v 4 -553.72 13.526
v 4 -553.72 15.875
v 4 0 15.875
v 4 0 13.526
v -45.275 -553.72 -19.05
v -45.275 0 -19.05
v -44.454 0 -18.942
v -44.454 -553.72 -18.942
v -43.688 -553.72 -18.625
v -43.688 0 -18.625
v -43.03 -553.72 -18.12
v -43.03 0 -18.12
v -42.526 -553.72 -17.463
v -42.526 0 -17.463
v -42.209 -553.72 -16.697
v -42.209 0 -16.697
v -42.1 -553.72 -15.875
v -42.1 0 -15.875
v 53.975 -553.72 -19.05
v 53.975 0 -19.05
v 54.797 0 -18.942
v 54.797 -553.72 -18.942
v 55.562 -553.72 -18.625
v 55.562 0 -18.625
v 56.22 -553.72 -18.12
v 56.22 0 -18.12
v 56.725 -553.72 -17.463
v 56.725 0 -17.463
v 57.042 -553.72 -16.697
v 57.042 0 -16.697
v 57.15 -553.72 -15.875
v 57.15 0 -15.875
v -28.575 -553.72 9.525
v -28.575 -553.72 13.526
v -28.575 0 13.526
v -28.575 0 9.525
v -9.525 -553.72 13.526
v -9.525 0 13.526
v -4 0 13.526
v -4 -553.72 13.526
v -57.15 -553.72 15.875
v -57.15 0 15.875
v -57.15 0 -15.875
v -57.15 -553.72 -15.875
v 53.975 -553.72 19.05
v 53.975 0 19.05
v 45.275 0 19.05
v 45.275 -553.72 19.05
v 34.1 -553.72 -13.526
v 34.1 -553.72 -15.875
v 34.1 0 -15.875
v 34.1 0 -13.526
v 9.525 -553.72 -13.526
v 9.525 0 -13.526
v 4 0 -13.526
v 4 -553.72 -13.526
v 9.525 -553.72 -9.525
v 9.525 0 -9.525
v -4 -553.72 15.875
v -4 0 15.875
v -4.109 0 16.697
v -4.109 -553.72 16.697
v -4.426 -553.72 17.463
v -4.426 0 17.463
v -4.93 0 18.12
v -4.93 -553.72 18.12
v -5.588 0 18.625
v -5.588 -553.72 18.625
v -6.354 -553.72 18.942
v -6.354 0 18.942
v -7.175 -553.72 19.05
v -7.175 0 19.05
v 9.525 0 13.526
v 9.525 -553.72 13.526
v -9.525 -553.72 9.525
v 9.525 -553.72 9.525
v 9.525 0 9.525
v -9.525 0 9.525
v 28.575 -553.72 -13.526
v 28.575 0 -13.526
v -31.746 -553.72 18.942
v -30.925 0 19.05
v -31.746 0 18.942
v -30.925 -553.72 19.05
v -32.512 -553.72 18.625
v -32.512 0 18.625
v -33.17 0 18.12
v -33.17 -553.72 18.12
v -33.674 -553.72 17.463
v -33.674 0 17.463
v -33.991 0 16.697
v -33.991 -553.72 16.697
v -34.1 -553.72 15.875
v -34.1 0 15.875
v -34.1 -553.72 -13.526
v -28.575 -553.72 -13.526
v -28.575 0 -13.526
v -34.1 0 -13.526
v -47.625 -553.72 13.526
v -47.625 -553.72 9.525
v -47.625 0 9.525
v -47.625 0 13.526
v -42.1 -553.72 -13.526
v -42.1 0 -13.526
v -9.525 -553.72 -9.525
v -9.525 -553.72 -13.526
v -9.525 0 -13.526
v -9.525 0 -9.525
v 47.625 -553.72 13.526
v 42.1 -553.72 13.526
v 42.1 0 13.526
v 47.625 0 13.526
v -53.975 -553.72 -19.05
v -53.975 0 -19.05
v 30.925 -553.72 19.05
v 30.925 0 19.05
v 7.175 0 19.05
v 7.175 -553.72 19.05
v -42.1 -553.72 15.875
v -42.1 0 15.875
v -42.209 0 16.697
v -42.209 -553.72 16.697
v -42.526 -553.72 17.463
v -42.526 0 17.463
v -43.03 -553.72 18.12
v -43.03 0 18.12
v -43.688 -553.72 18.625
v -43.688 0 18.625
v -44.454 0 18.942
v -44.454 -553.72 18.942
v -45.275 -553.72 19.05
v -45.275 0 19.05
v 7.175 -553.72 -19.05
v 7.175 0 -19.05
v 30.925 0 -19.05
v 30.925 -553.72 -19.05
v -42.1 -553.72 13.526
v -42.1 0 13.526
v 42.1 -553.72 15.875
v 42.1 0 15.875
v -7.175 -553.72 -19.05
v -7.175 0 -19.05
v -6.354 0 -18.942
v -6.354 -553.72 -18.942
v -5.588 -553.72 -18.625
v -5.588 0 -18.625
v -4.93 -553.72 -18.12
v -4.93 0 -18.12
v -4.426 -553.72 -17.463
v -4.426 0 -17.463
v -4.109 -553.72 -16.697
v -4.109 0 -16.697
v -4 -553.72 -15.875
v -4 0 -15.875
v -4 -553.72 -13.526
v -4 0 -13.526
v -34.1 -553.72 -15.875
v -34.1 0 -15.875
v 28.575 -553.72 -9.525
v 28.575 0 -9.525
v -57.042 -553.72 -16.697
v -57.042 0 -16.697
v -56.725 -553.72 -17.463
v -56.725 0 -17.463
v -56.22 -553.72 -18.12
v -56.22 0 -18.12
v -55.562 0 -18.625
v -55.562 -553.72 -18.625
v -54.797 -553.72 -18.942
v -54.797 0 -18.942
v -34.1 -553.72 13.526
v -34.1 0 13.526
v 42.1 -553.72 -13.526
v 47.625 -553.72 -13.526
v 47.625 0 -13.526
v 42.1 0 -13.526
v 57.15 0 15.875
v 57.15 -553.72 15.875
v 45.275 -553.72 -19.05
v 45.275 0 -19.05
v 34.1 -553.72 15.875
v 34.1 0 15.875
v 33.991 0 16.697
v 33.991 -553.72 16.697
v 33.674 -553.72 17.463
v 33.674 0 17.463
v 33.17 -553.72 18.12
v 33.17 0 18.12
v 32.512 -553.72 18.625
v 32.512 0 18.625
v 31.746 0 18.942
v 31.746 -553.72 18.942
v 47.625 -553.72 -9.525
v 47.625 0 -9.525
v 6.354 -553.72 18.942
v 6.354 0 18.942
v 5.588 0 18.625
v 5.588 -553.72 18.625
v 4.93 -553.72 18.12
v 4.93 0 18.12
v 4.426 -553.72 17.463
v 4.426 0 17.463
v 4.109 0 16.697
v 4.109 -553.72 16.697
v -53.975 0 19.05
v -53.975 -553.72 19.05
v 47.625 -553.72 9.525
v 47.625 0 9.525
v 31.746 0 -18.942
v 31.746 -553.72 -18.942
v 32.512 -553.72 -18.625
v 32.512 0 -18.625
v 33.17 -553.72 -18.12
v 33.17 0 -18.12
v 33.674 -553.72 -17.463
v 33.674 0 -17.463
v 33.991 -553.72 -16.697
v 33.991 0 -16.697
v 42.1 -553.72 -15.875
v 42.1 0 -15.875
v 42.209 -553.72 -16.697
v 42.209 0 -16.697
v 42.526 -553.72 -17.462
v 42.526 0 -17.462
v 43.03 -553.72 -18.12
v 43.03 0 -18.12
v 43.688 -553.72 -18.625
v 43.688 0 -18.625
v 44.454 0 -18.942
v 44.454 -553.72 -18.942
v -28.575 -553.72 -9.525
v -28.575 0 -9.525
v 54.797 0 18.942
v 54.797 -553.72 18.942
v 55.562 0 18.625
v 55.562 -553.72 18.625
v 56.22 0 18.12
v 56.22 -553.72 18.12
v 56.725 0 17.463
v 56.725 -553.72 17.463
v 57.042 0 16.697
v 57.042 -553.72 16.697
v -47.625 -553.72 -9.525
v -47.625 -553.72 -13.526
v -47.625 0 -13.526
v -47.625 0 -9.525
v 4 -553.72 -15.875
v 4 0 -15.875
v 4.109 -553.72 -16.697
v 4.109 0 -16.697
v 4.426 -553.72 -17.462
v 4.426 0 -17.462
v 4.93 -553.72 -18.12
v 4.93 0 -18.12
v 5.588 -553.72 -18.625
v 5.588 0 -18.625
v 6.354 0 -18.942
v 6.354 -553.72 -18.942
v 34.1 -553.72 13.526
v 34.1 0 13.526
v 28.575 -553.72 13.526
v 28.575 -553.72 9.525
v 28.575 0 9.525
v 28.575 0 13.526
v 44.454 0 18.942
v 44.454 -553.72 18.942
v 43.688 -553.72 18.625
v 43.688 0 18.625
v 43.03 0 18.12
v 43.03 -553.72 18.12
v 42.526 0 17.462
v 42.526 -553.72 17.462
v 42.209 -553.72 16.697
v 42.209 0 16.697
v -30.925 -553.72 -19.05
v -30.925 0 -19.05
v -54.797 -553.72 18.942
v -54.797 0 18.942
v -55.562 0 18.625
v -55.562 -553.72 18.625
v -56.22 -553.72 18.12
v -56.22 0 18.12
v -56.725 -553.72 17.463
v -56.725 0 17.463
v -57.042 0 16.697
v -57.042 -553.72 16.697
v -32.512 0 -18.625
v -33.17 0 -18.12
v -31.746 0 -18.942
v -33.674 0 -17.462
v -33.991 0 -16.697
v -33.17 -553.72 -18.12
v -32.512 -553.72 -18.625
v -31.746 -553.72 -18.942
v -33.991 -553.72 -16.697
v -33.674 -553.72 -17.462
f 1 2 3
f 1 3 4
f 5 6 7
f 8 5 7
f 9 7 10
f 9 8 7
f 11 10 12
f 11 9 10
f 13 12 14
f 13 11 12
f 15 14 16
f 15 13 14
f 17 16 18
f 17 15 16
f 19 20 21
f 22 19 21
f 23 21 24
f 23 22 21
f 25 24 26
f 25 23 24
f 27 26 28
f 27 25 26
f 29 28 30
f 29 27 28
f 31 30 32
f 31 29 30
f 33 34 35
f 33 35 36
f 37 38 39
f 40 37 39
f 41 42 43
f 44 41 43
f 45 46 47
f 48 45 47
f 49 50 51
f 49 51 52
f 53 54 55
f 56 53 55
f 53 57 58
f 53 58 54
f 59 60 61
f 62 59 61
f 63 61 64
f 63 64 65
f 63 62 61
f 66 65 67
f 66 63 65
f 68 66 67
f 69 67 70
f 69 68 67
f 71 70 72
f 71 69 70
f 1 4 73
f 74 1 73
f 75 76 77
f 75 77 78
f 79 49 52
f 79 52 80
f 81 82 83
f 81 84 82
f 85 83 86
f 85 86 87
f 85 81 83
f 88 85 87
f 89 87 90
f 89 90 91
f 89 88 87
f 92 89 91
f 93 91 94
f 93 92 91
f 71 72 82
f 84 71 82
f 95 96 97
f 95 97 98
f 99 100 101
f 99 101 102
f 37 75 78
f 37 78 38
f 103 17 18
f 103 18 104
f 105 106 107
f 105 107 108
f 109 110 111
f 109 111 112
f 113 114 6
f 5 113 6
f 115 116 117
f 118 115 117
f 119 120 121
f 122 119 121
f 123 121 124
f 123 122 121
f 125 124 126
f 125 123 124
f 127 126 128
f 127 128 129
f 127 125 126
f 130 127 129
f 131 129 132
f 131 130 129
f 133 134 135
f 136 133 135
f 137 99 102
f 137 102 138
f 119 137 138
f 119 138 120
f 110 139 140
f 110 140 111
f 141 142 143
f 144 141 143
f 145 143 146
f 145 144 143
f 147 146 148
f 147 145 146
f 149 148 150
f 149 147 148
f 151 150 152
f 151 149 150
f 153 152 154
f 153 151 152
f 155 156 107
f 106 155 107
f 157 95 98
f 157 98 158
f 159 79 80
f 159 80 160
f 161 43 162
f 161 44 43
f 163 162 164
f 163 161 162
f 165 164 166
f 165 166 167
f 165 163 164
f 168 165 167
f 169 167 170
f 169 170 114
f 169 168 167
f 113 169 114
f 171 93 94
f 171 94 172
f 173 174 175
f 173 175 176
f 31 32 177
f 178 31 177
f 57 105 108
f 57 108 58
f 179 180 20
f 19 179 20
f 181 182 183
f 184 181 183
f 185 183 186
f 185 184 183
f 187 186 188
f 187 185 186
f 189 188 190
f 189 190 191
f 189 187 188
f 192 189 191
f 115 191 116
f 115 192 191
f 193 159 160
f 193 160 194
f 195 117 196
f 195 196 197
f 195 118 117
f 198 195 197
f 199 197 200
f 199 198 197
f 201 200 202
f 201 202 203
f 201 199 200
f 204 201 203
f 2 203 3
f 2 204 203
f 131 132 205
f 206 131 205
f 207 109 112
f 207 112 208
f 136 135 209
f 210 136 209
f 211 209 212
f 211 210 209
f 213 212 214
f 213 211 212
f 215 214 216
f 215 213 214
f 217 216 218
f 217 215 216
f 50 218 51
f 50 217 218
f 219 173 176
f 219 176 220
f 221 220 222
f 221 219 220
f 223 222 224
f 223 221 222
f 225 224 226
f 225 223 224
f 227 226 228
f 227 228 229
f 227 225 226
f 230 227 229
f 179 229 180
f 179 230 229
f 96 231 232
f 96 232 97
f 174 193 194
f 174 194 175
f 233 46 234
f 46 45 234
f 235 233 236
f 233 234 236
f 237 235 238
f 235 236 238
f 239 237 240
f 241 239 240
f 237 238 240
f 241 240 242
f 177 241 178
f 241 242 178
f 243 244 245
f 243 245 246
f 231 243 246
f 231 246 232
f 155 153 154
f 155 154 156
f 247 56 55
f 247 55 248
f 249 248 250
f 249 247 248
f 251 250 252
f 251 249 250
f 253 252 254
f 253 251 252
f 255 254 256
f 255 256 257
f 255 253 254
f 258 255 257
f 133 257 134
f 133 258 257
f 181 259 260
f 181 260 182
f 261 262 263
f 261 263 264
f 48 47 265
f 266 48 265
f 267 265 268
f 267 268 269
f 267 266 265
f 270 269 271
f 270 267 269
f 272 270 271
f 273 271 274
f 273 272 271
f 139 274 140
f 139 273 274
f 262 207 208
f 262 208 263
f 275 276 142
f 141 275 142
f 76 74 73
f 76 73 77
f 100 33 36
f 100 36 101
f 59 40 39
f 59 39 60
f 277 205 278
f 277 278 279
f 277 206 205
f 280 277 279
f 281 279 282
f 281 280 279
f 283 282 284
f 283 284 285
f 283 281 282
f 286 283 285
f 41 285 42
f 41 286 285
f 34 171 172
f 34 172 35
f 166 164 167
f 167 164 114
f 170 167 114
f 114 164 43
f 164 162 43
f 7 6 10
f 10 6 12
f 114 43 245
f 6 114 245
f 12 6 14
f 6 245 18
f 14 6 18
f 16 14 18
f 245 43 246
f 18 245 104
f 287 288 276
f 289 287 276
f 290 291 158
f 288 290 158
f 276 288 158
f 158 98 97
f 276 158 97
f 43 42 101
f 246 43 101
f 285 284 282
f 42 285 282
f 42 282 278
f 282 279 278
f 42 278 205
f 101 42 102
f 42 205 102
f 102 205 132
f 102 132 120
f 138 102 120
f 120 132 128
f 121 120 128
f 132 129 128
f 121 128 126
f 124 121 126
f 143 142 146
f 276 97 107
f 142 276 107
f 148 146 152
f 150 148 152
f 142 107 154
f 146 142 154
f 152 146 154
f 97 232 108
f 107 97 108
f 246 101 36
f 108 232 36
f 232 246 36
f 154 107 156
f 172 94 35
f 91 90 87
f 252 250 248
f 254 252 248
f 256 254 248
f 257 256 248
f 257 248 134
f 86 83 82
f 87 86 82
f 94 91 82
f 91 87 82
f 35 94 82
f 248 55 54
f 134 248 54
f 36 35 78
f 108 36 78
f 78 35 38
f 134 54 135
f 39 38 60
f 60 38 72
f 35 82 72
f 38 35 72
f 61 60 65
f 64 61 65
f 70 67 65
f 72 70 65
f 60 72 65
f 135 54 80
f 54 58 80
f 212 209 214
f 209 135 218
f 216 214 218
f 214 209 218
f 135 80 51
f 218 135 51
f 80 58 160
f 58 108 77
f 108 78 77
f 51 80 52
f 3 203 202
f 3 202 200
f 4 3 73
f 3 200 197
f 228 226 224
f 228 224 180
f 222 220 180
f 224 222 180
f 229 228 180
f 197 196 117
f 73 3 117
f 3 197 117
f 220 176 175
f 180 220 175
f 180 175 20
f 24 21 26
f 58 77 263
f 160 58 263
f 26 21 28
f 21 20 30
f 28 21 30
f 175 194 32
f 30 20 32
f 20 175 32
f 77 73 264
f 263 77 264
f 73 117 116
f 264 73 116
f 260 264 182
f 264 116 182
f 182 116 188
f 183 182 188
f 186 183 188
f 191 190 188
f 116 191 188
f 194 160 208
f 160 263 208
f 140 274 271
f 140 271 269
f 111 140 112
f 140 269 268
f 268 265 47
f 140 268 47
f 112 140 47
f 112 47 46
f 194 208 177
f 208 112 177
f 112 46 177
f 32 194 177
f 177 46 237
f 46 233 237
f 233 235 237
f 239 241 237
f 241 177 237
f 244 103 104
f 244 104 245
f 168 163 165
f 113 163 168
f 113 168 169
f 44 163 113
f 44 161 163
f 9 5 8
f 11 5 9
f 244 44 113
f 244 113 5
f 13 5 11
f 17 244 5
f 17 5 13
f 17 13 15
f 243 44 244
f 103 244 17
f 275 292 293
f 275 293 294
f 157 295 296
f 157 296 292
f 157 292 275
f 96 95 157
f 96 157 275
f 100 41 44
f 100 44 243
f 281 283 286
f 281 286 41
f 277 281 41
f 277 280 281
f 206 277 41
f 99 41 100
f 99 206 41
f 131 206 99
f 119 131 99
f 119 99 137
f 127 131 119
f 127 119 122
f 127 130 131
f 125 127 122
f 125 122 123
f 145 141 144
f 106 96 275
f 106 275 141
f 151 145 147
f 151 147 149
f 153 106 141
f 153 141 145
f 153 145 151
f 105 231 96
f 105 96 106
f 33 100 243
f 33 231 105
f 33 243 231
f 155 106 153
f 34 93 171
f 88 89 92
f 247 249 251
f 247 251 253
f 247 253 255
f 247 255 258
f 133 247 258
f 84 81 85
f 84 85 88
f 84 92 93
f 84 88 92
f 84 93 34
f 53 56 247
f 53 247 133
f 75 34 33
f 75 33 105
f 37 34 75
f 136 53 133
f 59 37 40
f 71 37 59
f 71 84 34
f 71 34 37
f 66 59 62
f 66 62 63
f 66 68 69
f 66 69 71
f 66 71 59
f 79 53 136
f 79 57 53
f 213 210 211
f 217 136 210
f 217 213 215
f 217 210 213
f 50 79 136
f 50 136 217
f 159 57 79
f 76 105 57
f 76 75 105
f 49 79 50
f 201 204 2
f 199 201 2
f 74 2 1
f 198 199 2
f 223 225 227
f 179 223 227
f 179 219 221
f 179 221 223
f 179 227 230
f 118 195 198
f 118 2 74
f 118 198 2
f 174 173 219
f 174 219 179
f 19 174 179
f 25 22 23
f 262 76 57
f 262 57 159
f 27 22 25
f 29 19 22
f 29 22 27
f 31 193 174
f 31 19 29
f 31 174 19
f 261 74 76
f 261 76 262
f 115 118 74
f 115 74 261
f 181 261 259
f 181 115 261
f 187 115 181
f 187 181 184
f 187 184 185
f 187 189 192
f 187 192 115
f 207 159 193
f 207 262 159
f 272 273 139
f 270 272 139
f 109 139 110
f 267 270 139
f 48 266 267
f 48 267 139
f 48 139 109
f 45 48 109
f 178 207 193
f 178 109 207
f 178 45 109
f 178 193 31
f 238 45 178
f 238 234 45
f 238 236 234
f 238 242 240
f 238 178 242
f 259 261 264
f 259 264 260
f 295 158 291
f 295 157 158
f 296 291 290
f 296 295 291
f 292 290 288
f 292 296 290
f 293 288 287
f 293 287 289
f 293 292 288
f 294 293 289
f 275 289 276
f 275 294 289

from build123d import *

# Parameters (mm, degrees)
F1_DEPTH = 553.72
F2_R     = 3.175


with BuildPart() as f1:
    # F0 (on Front) → F1 (new body)
    with BuildSketch(Plane.XZ):
        Polygon((57.15, 19.05), (42.1005, 19.05), (42.1005, 13.5255), (47.625, 13.5255), (47.625, 9.525), (42.1005, 9.525), (38.1, 9.525), (38.1, -9.525), (42.1005, -9.525), (47.625, -9.525), (47.625, -13.5255), (42.1005, -13.5255), (42.1005, -19.05), (57.15, -19.05), align=None)
        Polygon((-42.1005, 13.5255), (-42.1005, 19.05), (-57.15, 19.05), (-57.15, -19.05), (-42.1005, -19.05), (-42.1005, -13.5255), (-47.625, -13.5255), (-47.625, -9.525), (-42.1005, -9.525), (-38.1, -9.525), (-38.1, 9.525), (-42.1005, 9.525), (-47.625, 9.525), (-47.625, 13.5255), align=None)
        Polygon((-17.881323, 19.05), (-19.05, 19.05), (-34.0995, 19.05), (-34.0995, 13.5255), (-28.575, 13.5255), (-28.575, 9.525), (-34.0995, 9.525), (-38.1, 9.525), (-38.1, -9.525), (-34.0995, -9.525), (-28.575, -9.525), (-28.575, -13.5255), (-34.0995, -13.5255), (-34.0995, -19.05), (-19.05, -19.05), (-4.0005, -19.05), (-4.0005, -13.5255), (-9.525, -13.5255), (-9.525, -9.525), (-4.0005, -9.525), (0, -9.525), (0, 9.525), (-4.0005, 9.525), (-9.525, 9.525), (-9.525, 13.5255), (-4.0005, 13.5255), (-4.0005, 19.05), align=None)
        Polygon((19.05, 19.05), (4.0005, 19.05), (4.0005, 13.5255), (9.525, 13.5255), (9.525, 9.525), (4.0005, 9.525), (0, 9.525), (0, -9.525), (4.0005, -9.525), (9.525, -9.525), (9.525, -13.5255), (4.0005, -13.5255), (4.0005, -19.05), (19.05, -19.05), (34.0995, -19.05), (34.0995, -13.5255), (28.575, -13.5255), (28.575, -9.525), (34.0995, -9.525), (38.1, -9.525), (38.1, 9.525), (34.0995, 9.525), (28.575, 9.525), (28.575, 13.5255), (34.0995, 13.5255), (34.0995, 19.05), align=None)
    extrude(amount=F1_DEPTH)

    # F2
    f2_edges = [f1.edges().sort_by_distance(p)[0] for p in [
        (4.0005, -276.86, -19.05),
        (34.0995, -276.86, -19.05),
        (42.1005, -276.86, -19.05),
        (57.15, -276.86, -19.05),
        (-4.0005, -276.86, -19.05),
        (-34.0995, -276.86, -19.05),
        (-42.1005, -276.86, -19.05),
        (-57.15, -276.86, -19.05),
        (-57.15, -276.86, 19.05),
        (-42.1005, -276.86, 19.05),
        (-34.0995, -276.86, 19.05),
        (-4.0005, -276.86, 19.05),
        (4.0005, -276.86, 19.05),
        (34.0995, -276.86, 19.05),
        (42.1005, -276.86, 19.05),
        (57.15, -276.86, 19.05),
    ]]
    fillet(f2_edges, radius=F2_R)


solid = f1.part
